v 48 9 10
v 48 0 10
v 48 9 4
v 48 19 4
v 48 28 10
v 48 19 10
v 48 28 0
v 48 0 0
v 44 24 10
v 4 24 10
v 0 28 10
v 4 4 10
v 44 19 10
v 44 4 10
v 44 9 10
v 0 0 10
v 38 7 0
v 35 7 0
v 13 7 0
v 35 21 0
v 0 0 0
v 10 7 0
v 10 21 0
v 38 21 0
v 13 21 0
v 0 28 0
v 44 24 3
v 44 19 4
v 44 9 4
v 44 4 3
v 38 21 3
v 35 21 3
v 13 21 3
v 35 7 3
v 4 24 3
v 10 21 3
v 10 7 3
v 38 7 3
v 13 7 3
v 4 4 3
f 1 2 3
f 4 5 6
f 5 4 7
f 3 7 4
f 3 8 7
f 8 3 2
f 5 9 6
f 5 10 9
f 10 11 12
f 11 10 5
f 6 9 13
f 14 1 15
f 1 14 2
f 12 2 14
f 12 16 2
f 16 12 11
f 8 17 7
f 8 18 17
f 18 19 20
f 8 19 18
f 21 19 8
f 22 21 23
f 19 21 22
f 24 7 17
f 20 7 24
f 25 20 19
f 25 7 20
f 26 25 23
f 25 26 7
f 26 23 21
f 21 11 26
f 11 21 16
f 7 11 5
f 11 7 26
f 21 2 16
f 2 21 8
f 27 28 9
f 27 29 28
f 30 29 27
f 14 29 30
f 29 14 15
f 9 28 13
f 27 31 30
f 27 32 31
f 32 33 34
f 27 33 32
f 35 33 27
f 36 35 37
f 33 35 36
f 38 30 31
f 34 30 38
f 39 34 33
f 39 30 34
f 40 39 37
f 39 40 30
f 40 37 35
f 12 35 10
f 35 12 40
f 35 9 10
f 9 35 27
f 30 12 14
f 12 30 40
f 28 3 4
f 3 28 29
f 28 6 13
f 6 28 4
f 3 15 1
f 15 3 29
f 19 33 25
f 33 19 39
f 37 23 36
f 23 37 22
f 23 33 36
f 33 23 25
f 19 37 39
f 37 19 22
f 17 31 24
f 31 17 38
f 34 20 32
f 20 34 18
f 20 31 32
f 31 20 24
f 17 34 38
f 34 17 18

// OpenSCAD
// Original MechIntel educational model. CC0-1.0. Units: mm.
// Not a standardized or load-rated component.
$fn=96;
inner_x=40;
inner_y=20;
wall=4;
base=3;
rim=7;
$fn=64;
difference(){union(){
translate([0,0,0]) cube([inner_x+2*wall,inner_y+2*wall,base+rim]);
}
translate([wall,wall,base]) cube([inner_x,inner_y,rim+1]);
translate([inner_x+wall-1,9,base+1]) cube([wall+2,10,rim]);
translate([10,7,-1]) cube([3,14,base+2]);
translate([35,7,-1]) cube([3,14,base+2]);
}
